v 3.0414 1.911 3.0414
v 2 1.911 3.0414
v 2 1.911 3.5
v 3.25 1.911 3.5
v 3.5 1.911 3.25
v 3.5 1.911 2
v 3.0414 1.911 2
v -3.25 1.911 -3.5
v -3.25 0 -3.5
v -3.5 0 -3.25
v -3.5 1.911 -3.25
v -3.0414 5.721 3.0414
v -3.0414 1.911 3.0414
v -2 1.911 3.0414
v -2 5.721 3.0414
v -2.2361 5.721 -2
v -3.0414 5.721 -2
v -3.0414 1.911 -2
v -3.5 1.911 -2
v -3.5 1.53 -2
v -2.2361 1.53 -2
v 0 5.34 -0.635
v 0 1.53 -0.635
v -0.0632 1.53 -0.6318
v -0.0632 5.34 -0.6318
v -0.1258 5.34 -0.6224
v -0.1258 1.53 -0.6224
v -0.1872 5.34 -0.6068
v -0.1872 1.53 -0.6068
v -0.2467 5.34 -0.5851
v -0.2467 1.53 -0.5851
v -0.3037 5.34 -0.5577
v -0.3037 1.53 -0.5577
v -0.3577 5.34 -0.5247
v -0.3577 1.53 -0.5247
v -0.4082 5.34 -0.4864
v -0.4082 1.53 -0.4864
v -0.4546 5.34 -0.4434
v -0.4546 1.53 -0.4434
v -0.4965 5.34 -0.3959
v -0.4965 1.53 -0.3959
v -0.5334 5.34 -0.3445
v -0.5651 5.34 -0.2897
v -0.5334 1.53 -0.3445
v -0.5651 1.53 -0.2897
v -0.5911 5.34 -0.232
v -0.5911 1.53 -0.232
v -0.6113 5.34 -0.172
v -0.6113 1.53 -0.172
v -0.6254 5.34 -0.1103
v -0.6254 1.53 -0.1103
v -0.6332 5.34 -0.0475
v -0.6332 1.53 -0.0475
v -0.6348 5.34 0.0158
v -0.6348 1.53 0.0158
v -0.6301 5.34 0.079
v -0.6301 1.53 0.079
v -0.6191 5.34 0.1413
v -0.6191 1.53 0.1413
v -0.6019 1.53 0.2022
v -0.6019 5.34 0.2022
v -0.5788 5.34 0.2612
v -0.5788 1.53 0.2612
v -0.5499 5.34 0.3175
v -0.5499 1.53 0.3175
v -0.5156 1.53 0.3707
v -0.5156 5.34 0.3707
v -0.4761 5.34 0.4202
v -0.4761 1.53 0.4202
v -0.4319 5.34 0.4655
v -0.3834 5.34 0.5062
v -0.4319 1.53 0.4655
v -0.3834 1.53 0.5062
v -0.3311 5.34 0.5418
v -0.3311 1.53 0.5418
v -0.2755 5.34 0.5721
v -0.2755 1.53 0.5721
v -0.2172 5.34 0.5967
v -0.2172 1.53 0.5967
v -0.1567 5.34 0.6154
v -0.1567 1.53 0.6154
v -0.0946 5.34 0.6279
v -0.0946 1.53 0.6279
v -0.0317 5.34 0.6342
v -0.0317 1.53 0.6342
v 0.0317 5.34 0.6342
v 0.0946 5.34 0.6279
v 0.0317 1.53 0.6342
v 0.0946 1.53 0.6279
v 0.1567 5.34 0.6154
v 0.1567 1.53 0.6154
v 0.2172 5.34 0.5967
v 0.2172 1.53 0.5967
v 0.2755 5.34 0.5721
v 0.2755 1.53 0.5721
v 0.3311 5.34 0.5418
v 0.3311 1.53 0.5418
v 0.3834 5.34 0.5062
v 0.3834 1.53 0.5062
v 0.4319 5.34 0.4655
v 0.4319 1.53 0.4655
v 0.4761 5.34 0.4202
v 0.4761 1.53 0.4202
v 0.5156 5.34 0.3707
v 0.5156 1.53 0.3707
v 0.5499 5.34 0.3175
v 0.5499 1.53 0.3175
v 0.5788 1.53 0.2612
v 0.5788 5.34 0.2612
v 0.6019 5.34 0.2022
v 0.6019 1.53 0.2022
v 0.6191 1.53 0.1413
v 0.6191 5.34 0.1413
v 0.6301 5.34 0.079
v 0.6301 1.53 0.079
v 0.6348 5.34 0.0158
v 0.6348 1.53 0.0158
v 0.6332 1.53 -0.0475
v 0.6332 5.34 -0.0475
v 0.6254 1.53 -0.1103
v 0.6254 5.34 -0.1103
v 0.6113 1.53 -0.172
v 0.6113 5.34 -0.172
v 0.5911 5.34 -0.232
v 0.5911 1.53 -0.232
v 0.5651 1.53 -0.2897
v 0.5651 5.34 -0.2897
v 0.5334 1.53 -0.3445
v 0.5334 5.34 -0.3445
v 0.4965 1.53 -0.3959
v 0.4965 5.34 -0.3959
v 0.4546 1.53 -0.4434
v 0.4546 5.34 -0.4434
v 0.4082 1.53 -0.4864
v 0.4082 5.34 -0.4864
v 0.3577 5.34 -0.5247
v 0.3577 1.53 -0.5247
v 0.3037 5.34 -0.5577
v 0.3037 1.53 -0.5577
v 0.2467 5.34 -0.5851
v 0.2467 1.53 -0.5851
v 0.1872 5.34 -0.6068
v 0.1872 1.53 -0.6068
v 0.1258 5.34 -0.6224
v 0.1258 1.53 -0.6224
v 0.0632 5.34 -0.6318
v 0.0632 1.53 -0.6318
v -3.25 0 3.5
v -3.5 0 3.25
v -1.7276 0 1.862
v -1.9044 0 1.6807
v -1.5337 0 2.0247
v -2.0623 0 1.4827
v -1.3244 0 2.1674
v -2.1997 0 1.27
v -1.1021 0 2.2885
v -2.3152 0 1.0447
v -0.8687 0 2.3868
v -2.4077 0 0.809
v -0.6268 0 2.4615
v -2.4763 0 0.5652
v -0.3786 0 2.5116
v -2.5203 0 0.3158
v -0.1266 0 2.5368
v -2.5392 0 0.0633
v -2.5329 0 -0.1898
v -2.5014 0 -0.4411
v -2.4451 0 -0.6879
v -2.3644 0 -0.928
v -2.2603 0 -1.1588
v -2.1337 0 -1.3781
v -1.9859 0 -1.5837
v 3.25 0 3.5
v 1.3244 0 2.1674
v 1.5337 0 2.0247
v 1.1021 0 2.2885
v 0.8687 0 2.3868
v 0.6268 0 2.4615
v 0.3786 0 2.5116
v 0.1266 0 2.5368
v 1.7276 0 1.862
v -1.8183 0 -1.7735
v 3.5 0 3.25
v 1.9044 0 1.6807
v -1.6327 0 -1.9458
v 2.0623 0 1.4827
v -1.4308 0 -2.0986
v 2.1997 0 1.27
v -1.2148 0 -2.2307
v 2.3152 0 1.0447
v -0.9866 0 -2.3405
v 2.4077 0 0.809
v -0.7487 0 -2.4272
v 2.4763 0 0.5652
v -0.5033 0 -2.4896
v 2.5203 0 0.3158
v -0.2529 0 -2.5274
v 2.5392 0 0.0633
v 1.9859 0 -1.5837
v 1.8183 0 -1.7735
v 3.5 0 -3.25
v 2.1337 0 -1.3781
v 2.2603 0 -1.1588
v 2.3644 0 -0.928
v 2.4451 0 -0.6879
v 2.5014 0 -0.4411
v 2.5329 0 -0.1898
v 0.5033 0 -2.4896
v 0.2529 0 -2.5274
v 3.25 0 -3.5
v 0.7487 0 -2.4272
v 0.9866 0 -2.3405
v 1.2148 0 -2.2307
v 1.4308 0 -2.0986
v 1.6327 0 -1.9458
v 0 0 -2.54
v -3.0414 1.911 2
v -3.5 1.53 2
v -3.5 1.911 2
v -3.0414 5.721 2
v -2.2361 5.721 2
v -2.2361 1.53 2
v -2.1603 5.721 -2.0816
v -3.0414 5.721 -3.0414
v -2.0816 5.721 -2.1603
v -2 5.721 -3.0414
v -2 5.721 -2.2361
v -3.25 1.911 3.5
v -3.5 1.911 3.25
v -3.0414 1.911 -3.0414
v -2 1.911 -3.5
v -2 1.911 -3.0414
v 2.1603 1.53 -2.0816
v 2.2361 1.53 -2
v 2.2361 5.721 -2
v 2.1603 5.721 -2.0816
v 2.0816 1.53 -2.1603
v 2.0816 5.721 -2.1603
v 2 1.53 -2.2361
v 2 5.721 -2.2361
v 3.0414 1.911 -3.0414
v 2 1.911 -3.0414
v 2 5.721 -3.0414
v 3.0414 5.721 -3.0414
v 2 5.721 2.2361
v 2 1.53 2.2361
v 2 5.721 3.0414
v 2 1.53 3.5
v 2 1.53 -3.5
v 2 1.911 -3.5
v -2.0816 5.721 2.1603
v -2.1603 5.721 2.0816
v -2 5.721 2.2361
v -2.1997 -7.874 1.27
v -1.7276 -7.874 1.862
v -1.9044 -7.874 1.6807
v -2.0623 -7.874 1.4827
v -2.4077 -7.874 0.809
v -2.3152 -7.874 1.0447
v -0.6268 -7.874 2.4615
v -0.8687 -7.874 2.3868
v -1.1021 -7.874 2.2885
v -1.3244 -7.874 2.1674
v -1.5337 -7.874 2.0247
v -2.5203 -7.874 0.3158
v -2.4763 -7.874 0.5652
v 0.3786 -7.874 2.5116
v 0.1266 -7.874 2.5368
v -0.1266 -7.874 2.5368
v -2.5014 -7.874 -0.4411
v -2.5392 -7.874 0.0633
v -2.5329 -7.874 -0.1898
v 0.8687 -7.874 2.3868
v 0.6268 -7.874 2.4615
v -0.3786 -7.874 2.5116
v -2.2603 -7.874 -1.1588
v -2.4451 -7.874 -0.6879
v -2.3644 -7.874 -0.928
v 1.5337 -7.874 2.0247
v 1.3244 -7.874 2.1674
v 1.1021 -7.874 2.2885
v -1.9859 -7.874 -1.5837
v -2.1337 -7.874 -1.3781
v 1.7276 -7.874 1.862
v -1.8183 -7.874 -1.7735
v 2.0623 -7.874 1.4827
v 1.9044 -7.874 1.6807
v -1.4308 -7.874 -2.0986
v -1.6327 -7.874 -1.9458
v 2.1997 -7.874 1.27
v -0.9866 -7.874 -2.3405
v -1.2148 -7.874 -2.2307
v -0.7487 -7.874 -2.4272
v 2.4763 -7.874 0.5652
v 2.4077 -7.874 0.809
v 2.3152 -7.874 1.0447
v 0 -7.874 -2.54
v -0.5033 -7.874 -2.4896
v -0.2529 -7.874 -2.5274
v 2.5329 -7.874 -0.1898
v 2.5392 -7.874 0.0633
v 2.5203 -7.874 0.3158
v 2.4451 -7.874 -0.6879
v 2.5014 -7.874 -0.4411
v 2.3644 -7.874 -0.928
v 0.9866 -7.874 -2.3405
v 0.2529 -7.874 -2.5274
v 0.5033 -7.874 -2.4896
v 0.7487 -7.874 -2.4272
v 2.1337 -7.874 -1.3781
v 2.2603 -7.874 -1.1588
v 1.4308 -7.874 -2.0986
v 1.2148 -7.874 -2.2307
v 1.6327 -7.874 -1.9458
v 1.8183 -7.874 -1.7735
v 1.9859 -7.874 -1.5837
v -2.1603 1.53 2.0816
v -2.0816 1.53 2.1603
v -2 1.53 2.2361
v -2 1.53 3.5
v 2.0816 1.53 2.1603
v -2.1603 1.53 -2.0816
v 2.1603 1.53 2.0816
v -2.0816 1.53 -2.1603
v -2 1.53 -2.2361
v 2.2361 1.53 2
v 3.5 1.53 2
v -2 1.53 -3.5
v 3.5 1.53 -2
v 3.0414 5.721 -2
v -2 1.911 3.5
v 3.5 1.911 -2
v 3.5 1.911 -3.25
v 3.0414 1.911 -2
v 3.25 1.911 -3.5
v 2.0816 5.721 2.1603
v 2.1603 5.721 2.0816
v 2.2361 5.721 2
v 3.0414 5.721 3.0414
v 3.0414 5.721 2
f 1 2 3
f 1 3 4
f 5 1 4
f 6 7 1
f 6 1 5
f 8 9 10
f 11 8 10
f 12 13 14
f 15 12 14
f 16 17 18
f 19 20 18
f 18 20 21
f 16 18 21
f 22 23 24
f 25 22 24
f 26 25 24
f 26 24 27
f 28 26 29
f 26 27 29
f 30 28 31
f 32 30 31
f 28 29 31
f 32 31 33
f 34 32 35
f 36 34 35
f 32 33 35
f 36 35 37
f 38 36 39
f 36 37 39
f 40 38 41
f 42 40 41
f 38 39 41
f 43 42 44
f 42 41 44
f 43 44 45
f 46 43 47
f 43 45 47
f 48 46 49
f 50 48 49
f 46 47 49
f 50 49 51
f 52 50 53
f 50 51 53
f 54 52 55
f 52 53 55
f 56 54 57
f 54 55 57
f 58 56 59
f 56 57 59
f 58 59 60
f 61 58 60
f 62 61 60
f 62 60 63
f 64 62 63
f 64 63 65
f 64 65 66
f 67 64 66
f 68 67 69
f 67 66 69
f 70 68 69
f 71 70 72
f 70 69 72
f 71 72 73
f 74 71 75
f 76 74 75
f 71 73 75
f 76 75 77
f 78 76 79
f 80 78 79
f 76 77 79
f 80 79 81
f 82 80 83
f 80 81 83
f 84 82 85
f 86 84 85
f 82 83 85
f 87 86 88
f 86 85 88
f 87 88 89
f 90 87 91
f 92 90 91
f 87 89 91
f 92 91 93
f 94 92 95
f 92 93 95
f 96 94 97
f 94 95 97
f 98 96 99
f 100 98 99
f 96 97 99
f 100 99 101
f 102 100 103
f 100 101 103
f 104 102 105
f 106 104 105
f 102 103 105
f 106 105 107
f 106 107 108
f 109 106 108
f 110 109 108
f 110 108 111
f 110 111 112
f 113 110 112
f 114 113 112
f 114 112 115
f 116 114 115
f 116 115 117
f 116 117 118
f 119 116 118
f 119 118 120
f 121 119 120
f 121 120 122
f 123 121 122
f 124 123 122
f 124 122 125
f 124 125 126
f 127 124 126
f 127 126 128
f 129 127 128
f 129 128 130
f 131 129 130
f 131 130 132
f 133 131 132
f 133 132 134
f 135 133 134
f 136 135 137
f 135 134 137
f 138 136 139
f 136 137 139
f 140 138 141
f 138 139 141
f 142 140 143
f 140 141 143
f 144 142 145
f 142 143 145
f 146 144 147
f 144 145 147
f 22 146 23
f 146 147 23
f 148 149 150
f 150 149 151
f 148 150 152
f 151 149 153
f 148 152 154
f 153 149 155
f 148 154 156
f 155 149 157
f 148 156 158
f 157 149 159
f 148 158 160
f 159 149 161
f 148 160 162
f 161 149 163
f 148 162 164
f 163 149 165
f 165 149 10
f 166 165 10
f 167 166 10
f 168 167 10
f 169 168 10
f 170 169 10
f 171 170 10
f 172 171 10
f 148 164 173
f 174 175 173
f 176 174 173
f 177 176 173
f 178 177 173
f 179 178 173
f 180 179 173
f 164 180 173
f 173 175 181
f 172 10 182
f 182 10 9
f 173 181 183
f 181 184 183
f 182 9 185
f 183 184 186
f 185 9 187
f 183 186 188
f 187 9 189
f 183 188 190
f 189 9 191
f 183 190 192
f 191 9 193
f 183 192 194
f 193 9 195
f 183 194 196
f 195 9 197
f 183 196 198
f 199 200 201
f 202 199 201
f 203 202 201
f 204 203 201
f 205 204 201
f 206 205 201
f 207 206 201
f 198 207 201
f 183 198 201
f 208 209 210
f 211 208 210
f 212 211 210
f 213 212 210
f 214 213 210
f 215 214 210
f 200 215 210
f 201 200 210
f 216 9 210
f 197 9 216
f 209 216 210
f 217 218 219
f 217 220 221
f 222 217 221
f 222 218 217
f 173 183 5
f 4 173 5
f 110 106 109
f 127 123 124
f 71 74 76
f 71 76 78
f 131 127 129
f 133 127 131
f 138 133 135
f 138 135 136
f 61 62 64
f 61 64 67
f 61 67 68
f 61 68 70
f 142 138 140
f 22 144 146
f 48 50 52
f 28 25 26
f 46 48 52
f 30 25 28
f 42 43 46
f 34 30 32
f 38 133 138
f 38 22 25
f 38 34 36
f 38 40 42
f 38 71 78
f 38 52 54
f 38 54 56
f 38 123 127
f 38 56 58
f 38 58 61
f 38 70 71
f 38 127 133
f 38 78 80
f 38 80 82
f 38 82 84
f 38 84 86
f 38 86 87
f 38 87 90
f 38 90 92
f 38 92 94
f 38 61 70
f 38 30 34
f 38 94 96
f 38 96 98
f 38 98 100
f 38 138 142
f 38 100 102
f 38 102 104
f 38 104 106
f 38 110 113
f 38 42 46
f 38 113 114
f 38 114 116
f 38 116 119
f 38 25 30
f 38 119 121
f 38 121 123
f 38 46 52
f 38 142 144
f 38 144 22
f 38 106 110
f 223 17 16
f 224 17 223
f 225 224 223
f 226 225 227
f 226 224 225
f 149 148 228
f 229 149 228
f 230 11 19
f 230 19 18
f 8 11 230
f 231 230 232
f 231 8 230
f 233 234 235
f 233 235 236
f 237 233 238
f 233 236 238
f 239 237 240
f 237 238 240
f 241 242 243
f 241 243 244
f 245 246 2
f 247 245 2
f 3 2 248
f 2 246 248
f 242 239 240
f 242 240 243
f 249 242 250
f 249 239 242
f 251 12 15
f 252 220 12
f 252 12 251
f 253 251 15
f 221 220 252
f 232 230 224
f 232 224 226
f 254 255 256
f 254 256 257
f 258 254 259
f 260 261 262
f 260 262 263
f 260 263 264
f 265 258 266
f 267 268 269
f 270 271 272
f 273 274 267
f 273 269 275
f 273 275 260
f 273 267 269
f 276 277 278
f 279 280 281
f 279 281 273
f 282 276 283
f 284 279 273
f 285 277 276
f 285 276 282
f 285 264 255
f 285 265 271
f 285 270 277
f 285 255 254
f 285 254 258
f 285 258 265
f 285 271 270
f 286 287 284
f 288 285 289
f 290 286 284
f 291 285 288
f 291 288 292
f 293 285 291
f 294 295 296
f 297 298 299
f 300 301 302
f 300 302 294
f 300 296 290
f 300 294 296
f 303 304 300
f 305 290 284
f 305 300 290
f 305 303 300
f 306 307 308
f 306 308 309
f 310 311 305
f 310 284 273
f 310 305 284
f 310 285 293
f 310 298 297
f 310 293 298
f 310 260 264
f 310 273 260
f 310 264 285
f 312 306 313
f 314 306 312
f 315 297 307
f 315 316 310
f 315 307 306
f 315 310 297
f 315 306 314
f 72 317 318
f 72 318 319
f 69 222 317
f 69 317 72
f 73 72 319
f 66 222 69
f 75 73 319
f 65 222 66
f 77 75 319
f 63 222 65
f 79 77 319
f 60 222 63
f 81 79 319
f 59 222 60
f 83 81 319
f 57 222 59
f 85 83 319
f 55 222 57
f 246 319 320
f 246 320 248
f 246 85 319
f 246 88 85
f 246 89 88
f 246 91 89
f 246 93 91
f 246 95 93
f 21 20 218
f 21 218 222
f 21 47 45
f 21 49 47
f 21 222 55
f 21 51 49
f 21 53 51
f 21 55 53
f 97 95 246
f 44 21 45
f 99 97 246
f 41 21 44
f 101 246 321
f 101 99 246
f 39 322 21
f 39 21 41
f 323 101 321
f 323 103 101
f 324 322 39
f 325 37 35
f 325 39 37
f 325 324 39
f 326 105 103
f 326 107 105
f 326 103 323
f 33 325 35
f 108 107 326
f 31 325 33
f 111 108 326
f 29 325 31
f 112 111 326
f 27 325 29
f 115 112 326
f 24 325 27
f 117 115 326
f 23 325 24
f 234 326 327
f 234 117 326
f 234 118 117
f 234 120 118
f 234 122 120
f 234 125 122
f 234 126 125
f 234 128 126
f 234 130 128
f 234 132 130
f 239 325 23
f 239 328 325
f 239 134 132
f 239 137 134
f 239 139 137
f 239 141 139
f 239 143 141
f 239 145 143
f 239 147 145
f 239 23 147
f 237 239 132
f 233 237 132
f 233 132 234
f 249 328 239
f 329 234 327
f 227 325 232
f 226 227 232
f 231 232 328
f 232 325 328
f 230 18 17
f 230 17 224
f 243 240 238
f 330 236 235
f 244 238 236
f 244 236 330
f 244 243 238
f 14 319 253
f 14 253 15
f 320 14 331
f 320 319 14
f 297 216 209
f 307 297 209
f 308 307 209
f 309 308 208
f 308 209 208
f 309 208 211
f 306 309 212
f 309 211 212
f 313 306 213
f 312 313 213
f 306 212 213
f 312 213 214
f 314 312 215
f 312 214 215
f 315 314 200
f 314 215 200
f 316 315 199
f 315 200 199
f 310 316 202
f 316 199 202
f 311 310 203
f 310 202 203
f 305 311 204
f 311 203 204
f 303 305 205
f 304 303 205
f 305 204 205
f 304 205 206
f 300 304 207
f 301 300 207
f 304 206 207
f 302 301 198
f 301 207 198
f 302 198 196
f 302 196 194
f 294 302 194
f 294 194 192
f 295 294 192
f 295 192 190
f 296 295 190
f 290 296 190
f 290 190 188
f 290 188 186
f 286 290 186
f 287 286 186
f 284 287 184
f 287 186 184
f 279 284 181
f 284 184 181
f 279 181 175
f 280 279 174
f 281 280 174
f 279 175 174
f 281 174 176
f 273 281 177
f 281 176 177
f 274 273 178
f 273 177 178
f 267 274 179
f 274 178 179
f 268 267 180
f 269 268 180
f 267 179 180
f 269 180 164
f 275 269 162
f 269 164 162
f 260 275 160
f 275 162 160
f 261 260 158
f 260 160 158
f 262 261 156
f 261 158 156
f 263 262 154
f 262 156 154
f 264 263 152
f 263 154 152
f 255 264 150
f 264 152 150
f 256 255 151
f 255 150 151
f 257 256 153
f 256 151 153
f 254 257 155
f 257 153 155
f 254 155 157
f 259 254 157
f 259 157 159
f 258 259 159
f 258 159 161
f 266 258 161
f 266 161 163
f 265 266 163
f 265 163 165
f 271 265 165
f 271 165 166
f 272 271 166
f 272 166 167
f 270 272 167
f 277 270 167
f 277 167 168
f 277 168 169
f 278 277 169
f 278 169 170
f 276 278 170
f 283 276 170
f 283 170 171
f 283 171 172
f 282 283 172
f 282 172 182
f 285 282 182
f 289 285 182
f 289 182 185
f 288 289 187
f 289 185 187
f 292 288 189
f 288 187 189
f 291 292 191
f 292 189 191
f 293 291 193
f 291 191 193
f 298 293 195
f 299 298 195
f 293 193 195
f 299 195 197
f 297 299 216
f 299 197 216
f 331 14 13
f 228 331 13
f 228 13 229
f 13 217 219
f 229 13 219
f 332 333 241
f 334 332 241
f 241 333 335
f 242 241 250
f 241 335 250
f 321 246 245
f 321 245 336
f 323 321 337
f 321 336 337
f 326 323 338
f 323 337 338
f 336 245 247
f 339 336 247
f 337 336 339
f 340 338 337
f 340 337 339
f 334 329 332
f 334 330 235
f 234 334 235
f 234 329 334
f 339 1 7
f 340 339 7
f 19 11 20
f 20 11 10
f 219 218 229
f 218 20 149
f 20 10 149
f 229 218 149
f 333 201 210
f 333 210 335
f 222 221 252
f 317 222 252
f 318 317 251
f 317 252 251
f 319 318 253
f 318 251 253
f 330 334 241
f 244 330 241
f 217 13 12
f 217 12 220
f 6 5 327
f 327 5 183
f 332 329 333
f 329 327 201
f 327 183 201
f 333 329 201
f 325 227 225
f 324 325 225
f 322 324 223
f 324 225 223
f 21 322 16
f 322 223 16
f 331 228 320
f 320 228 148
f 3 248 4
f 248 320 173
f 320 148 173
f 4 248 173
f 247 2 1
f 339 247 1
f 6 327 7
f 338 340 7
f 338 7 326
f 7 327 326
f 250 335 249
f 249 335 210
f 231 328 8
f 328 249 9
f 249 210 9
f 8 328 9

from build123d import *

# Parameters (mm, degrees)
SKETCH1_W           = 7
SKETCH1_H           = 7
BOSS_EXTRUDE1_DEPTH = 1.53
SKETCH2_R           = 2.54
BOSS_EXTRUDE2_DEPTH = 7.874
SKETCH3_R           = 0.635
BOSS_EXTRUDE3_DEPTH = 3.81
CHAMFER1_SIZE       = 0.25
BOSS_EXTRUDE4_DEPTH = 0.381
SKETCH5_W           = 1.0414
SKETCH5_H           = 1.0414
BOSS_EXTRUDE5_DEPTH = 3.81
SKETCH6_R           = 3
SKETCH6_R_2         = 2.55
FILE_TO_FIT_DEPTH   = 4.191


with BuildPart() as part:
    # Sketch1 → Boss-Extrude1 (new body)
    with BuildSketch(Plane(origin=(0, 0, 0), x_dir=(1, 0, 0), z_dir=(0, 1, 0))):
        Rectangle(SKETCH1_W, SKETCH1_H)
    extrude(amount=BOSS_EXTRUDE1_DEPTH)

    # Sketch2 → Boss-Extrude2 (add)
    with BuildSketch(Plane.XZ):
        with Locations(Location((0, 0, 0), (0, 0, 270))):
            Circle(SKETCH2_R)
    extrude(amount=BOSS_EXTRUDE2_DEPTH)

    # Sketch3 → Boss-Extrude3 (add)
    with BuildSketch(Plane(origin=(0, 1.53, 0), x_dir=(1, 0, 0), z_dir=(0, 1, 0))):
        with Locations(Location((0, 0, 0), (0, 0, 90))):
            Circle(SKETCH3_R)
    extrude(amount=BOSS_EXTRUDE3_DEPTH)

    # Chamfer1
    chamfer1_edges = [part.edges().sort_by_distance(p)[0] for p in [
        (3.5, 0.765, 3.5),
        (-3.5, 0.765, 3.5),
        (-3.5, 0.765, -3.5),
        (3.5, 0.765, -3.5),
    ]]
    chamfer(chamfer1_edges, length=CHAMFER1_SIZE)

    # Sketch4 → Boss-Extrude4 (add)
    with BuildSketch(Plane(origin=(0, 1.53, 0), x_dir=(1, 0, 0), z_dir=(0, 1, 0))):
        Polygon((-3.5, 2), (-2, 2), (-2, 3.5), (-3.25, 3.5), (-3.5, 3.25), align=None)
        Polygon((3.5, 3.25), (3.5, 2), (2, 2), (2, 3.5), (3.25, 3.5), align=None)
        Polygon((3.5, -2), (2, -2), (2, -3.5), (3.25, -3.5), (3.5, -3.25), align=None)
        Polygon((-3.5, -3.25), (-3.5, -2), (-2, -2), (-2, -3.5), (-3.25, -3.5), align=None)
    extrude(amount=BOSS_EXTRUDE4_DEPTH)

    # Sketch5 → Boss-Extrude5 (add)
    with BuildSketch(Plane(origin=(0, 1.911, 0), x_dir=(1, 0, 0), z_dir=(0, 1, 0))):
        with Locations((-2.5207, 2.5207)):
            Rectangle(SKETCH5_W, SKETCH5_H)
        with Locations((2.5207, 2.5207)):
            Rectangle(SKETCH5_W, SKETCH5_H)
        with Locations((2.5207, -2.5207)):
            Rectangle(SKETCH5_W, SKETCH5_H)
        with Locations((-2.5207, -2.5207)):
            Rectangle(SKETCH5_W, SKETCH5_H)
    extrude(amount=BOSS_EXTRUDE5_DEPTH)

    # Sketch6 → File To Fit (cut)
    with BuildSketch(Plane(origin=(0, 5.721, 0), x_dir=(1, 0, 0), z_dir=(0, 1, 0))):
        Circle(SKETCH6_R)
        Circle(SKETCH6_R_2, mode=Mode.SUBTRACT)
    extrude(amount=-FILE_TO_FIT_DEPTH, mode=Mode.SUBTRACT)


solid = part.part
